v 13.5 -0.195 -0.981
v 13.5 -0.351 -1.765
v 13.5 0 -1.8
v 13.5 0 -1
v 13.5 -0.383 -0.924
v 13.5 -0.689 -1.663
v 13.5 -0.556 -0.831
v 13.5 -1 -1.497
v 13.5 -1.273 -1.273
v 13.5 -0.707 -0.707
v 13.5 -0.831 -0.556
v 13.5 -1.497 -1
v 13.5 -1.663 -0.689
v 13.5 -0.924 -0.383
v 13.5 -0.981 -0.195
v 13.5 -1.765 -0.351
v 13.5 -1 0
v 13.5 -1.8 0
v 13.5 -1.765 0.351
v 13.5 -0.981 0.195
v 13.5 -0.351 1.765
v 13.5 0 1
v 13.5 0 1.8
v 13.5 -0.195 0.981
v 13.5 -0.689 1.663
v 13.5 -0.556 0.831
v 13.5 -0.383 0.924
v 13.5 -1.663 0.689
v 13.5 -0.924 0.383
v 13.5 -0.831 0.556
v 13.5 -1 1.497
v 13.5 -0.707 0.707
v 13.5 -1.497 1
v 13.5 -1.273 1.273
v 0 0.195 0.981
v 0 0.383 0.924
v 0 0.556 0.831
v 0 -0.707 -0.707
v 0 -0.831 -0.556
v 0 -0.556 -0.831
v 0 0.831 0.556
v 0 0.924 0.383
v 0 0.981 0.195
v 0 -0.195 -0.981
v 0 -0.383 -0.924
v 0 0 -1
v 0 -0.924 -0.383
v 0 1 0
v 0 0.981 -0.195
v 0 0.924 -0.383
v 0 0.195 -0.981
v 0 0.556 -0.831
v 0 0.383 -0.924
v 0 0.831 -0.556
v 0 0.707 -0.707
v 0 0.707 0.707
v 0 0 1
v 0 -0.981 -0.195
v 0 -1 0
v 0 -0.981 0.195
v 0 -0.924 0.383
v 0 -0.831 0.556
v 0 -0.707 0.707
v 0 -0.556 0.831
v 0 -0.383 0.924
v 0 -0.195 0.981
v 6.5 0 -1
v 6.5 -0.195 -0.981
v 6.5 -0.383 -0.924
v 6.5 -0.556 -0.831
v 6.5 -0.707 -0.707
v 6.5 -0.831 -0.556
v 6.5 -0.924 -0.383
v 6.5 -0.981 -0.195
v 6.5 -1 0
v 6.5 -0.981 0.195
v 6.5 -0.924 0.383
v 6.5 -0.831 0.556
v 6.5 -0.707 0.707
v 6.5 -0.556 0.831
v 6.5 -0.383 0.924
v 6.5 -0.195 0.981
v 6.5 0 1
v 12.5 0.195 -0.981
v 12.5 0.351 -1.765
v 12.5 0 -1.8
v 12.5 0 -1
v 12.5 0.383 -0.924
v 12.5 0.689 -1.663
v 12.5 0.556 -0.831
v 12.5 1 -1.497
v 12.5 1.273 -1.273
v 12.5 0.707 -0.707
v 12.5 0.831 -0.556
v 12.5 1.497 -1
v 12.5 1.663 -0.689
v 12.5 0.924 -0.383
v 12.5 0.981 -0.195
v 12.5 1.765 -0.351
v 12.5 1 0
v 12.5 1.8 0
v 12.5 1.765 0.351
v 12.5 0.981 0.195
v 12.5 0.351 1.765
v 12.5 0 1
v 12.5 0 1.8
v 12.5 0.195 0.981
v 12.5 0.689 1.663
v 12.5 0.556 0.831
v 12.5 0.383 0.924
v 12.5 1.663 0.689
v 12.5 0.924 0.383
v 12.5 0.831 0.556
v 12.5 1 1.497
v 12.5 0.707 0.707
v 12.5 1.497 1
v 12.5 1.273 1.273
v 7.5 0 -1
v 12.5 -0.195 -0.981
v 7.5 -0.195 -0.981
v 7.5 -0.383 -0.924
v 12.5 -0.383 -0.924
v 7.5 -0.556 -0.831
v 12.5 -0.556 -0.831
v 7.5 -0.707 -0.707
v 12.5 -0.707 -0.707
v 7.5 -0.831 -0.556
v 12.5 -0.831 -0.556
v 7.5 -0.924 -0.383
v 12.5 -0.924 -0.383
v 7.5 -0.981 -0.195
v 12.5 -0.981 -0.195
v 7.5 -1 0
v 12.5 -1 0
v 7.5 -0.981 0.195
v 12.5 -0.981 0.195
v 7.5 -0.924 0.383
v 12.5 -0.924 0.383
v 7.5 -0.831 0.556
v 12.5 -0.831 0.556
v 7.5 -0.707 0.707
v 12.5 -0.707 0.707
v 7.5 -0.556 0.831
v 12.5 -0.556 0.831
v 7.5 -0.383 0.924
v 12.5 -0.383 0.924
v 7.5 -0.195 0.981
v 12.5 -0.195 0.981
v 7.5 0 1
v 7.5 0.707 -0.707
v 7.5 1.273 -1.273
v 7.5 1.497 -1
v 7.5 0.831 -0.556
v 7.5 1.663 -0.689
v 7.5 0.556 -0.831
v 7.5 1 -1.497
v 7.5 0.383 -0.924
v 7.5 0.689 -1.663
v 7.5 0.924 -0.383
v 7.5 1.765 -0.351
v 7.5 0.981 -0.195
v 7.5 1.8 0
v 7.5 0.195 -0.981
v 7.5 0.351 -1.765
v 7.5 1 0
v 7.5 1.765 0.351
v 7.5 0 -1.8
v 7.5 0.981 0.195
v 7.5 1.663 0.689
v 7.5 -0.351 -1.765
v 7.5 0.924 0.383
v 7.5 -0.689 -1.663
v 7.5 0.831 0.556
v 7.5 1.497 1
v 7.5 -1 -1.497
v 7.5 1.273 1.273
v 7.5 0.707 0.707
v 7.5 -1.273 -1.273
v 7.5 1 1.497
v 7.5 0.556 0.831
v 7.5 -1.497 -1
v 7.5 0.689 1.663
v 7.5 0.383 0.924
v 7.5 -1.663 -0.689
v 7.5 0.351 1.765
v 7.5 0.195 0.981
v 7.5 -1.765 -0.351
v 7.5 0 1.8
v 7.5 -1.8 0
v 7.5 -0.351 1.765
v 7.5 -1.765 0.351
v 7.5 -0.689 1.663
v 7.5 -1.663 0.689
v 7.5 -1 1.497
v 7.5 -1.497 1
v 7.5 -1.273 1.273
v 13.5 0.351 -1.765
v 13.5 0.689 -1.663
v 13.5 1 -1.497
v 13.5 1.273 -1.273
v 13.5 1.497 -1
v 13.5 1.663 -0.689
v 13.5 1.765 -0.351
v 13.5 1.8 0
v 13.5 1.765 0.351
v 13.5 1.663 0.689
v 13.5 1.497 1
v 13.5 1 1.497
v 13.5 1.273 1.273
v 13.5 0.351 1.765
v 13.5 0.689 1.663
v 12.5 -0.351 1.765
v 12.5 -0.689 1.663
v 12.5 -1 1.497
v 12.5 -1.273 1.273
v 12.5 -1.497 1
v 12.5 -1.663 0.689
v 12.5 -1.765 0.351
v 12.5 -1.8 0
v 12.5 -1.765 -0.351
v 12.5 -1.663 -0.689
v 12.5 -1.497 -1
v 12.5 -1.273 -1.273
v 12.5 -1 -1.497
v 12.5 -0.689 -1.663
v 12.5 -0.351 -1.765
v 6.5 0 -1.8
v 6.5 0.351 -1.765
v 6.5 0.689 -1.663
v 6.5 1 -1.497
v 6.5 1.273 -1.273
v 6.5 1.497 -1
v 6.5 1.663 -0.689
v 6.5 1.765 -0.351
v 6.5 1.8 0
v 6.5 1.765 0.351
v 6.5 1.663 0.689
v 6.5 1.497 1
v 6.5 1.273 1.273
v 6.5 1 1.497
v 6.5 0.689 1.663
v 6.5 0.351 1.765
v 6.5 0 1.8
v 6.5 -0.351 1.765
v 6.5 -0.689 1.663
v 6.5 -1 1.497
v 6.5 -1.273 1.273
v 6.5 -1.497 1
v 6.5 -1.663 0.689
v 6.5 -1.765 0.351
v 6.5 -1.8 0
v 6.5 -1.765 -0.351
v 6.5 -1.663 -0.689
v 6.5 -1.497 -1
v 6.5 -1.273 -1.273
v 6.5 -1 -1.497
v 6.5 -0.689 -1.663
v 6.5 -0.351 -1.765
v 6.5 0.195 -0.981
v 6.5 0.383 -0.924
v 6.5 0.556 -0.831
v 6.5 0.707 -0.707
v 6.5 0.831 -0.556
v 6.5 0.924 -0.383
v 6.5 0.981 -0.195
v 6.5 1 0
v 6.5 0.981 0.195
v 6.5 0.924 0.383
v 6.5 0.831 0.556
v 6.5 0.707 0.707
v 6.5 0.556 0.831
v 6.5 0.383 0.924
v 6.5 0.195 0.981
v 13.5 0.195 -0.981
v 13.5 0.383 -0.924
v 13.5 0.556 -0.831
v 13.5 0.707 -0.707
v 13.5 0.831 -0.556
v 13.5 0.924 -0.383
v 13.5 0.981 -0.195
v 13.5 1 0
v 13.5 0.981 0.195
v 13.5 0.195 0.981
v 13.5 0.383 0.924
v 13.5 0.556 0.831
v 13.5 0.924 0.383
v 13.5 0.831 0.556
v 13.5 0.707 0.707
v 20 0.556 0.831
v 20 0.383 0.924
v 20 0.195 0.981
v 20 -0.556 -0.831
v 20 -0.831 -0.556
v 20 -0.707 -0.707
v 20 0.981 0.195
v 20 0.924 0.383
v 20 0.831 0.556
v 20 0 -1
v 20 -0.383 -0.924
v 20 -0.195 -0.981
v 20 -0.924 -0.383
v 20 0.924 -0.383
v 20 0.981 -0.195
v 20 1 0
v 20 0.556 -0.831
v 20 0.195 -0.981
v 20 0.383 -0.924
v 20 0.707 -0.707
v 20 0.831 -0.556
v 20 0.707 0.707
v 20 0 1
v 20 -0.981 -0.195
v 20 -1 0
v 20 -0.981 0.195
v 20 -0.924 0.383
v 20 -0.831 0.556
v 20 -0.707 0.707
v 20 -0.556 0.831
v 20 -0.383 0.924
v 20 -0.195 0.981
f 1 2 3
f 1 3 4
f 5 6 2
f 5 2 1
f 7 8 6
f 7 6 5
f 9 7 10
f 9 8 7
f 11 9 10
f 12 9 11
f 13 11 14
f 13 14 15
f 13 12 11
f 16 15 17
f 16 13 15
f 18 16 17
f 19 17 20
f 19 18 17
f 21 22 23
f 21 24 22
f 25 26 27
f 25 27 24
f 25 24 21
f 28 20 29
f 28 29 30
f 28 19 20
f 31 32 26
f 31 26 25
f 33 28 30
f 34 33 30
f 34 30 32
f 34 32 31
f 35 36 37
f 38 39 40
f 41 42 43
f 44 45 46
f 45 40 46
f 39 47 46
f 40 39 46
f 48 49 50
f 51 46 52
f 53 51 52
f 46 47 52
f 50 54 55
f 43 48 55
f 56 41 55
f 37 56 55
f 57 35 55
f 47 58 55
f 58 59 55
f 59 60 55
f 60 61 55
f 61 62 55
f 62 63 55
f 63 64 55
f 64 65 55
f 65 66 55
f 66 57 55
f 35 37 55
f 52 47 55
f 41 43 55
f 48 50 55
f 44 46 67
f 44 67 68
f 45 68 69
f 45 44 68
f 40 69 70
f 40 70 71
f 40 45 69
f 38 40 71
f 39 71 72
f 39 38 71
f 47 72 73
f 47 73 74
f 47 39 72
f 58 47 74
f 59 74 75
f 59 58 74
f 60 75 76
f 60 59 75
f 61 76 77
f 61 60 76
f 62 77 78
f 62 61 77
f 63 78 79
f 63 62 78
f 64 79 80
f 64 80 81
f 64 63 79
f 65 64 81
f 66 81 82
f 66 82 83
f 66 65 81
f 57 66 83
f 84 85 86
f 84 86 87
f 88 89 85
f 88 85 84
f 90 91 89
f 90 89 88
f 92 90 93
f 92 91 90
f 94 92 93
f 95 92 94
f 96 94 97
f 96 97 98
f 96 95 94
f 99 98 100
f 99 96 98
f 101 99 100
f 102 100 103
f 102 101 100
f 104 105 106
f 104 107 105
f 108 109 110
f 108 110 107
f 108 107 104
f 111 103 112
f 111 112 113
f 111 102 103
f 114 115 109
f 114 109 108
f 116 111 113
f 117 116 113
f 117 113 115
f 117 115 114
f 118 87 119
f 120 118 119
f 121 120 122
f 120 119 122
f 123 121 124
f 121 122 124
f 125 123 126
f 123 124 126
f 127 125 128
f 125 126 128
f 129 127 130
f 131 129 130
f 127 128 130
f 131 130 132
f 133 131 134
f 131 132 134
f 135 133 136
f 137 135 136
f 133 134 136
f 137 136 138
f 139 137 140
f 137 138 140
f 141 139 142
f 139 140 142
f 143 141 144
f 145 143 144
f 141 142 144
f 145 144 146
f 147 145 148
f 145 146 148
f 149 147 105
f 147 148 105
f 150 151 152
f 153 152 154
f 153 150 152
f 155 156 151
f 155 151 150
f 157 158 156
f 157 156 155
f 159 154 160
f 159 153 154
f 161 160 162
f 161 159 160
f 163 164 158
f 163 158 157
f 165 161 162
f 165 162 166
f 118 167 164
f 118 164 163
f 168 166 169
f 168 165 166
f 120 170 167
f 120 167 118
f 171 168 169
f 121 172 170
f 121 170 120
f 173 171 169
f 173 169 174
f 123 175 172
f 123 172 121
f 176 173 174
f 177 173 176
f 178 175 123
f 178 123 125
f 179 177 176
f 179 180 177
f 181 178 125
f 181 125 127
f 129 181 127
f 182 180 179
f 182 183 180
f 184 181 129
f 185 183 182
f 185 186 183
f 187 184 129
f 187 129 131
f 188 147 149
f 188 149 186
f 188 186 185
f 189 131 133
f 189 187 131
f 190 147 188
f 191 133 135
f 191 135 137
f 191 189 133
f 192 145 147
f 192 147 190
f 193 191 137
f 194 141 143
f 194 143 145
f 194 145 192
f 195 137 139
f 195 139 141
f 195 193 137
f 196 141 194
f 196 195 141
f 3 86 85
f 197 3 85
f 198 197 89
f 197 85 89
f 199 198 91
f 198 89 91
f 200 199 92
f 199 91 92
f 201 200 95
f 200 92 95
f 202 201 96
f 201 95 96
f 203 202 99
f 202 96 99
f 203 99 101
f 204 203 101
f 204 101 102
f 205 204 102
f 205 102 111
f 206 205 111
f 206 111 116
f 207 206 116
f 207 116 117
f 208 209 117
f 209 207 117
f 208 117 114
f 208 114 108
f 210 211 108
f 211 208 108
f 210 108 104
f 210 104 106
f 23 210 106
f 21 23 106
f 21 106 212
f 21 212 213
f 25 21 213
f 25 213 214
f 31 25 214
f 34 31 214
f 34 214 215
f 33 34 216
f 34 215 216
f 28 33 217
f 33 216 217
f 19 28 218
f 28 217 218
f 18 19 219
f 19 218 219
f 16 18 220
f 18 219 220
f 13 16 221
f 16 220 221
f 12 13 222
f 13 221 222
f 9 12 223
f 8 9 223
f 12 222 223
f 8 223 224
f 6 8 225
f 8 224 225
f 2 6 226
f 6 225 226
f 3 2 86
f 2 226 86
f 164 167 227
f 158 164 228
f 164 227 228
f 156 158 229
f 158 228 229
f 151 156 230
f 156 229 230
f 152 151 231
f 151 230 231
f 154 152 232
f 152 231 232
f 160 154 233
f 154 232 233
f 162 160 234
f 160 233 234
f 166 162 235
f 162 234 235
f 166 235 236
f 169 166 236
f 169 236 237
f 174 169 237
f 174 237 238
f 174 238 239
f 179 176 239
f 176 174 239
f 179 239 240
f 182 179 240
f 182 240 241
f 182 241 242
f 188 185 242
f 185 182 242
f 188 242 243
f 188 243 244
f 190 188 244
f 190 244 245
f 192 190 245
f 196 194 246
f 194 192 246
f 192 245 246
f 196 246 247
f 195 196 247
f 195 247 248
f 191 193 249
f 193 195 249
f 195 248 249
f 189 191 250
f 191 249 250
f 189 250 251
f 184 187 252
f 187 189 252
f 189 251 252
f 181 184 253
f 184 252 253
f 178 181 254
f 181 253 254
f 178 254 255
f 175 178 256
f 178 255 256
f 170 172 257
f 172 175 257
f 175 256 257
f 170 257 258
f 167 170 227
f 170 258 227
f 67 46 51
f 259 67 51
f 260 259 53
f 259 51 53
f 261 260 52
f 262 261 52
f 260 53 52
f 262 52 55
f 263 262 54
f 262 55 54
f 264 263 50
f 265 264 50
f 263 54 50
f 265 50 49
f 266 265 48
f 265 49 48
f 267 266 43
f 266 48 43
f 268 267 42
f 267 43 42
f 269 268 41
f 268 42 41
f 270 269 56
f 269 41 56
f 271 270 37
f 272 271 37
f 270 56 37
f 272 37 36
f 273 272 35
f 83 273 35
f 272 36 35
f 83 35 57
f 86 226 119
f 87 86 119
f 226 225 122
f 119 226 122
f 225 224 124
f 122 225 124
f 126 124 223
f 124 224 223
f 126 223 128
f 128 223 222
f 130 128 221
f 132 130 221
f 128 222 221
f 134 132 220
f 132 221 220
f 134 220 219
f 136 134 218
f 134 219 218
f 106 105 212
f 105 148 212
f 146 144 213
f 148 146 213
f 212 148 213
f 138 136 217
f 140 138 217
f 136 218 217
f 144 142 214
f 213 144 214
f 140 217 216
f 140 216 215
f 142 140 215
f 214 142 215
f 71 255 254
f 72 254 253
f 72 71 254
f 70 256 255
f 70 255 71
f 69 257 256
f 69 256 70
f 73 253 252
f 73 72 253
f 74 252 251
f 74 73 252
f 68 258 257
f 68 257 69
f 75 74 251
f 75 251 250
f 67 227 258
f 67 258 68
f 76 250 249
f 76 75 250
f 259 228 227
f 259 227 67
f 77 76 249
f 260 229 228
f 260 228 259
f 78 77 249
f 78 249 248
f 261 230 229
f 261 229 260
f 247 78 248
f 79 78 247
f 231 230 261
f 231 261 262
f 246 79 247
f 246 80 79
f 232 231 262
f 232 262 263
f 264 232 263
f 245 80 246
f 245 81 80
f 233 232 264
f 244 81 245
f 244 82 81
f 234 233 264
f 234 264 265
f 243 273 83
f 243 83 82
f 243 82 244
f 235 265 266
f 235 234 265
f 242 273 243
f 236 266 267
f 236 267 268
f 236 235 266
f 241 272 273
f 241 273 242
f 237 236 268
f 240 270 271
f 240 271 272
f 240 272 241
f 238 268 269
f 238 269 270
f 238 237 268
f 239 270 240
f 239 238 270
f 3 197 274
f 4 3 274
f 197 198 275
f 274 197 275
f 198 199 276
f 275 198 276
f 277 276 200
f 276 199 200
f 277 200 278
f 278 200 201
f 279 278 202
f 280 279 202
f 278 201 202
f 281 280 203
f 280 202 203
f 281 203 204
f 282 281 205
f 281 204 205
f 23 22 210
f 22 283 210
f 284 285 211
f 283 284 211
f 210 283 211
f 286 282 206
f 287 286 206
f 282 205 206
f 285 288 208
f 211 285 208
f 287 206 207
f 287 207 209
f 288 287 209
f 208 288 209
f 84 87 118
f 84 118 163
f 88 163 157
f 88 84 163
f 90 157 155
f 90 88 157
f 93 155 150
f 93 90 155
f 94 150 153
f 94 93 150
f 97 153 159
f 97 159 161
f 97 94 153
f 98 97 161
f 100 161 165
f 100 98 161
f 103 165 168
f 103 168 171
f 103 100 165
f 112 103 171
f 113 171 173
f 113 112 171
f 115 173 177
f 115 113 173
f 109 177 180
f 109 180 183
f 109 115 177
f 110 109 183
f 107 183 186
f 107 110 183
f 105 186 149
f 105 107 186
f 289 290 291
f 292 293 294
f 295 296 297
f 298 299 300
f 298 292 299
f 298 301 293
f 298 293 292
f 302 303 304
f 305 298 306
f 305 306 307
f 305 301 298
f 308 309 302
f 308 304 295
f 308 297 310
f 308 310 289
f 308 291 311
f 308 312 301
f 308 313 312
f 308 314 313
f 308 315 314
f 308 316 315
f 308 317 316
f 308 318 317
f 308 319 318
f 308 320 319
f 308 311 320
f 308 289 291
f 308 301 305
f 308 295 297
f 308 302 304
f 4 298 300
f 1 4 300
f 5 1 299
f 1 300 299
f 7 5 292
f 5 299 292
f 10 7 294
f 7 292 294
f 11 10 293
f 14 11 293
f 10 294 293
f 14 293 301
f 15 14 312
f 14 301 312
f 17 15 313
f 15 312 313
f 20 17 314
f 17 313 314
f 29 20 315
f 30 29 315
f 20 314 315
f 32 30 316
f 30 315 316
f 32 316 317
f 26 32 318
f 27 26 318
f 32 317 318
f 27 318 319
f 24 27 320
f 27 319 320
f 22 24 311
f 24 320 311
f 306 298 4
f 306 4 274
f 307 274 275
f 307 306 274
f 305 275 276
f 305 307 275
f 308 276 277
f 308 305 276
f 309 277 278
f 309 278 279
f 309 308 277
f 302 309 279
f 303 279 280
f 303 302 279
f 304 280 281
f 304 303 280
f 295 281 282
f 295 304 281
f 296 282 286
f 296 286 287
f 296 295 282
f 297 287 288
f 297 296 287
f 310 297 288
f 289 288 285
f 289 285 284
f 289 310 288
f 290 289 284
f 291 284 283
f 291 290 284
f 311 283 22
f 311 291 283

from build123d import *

# Parameters (mm, degrees)
SKETCH1_R            = 1.8
BOSS_EXTRUDE1_DEPTH  = 20
CUT_EXTRUDE1_DEPTH   = 6.5
CUT_EXTRUDE2_DEPTH   = 5
MIRROR2_COPY_1_DEPTH = 6.5


with BuildPart() as part:
    # Sketch1 → Boss-Extrude1 (new body)
    with BuildSketch(Plane(origin=(0, 0, 0), x_dir=(0, 0, -1), z_dir=(1, 0, 0))):
        Circle(SKETCH1_R)
    extrude(amount=BOSS_EXTRUDE1_DEPTH)

    # Sketch2 → Cut-Extrude1 (cut)
    with BuildSketch(Plane(origin=(20, 0, 0), x_dir=(0, 0, -1), z_dir=(1, 0, 0))):
        with BuildLine():
            Line((-1, 0), (-1.8, 0))
            ThreePointArc((-1.8, 0), (0, 1.8), (1.8, 0))
            Line((1.8, 0), (1, 0))
            ThreePointArc((1, 0), (0, 1), (-1, 0))
        make_face()
    cut_extrude1 = extrude(amount=-CUT_EXTRUDE1_DEPTH, mode=Mode.SUBTRACT)

    # Sketch3 → Cut-Extrude2 (cut)
    with BuildSketch(Plane(origin=(12.5, 0, 0), x_dir=(0, 0, -1), z_dir=(1, 0, 0))):
        with BuildLine():
            Line((-1, 0), (-1.8, 0))
            ThreePointArc((-1.8, 0), (0, 1.8), (1.8, 0))
            Line((1.8, 0), (1, 0))
            ThreePointArc((1, 0), (0, 1), (-1, 0))
        make_face()
    cut_extrude2 = extrude(amount=-CUT_EXTRUDE2_DEPTH, mode=Mode.SUBTRACT)

    # Mirror1: Cut-Extrude1 across plane
    add(cut_extrude1.mirror(Plane(origin=(10, 0, 0), x_dir=(0, 0, 1), z_dir=(1, 0, 0))), mode=Mode.SUBTRACT)

    # Mirror2: Cut-Extrude2, Cut-Extrude1 across plane
    add(cut_extrude2.mirror(Plane.ZX), mode=Mode.SUBTRACT)
    add(cut_extrude1.mirror(Plane.ZX), mode=Mode.SUBTRACT)

    # Mirror2 copy 1 sketch → Mirror2 copy 1 (cut)
    with BuildSketch(Plane(origin=(0, 0, 0), x_dir=(0, 0, -1), z_dir=(-1, 0, 0))):
        with BuildLine():
            Line((-1, 0), (-1.8, 0))
            ThreePointArc((-1.8, 0), (0, 1.8), (1.8, 0))
            Line((1.8, 0), (1, 0))
            ThreePointArc((1, 0), (0, 1), (-1, 0))
        make_face()
    extrude(amount=-MIRROR2_COPY_1_DEPTH, mode=Mode.SUBTRACT)


solid = part.part
